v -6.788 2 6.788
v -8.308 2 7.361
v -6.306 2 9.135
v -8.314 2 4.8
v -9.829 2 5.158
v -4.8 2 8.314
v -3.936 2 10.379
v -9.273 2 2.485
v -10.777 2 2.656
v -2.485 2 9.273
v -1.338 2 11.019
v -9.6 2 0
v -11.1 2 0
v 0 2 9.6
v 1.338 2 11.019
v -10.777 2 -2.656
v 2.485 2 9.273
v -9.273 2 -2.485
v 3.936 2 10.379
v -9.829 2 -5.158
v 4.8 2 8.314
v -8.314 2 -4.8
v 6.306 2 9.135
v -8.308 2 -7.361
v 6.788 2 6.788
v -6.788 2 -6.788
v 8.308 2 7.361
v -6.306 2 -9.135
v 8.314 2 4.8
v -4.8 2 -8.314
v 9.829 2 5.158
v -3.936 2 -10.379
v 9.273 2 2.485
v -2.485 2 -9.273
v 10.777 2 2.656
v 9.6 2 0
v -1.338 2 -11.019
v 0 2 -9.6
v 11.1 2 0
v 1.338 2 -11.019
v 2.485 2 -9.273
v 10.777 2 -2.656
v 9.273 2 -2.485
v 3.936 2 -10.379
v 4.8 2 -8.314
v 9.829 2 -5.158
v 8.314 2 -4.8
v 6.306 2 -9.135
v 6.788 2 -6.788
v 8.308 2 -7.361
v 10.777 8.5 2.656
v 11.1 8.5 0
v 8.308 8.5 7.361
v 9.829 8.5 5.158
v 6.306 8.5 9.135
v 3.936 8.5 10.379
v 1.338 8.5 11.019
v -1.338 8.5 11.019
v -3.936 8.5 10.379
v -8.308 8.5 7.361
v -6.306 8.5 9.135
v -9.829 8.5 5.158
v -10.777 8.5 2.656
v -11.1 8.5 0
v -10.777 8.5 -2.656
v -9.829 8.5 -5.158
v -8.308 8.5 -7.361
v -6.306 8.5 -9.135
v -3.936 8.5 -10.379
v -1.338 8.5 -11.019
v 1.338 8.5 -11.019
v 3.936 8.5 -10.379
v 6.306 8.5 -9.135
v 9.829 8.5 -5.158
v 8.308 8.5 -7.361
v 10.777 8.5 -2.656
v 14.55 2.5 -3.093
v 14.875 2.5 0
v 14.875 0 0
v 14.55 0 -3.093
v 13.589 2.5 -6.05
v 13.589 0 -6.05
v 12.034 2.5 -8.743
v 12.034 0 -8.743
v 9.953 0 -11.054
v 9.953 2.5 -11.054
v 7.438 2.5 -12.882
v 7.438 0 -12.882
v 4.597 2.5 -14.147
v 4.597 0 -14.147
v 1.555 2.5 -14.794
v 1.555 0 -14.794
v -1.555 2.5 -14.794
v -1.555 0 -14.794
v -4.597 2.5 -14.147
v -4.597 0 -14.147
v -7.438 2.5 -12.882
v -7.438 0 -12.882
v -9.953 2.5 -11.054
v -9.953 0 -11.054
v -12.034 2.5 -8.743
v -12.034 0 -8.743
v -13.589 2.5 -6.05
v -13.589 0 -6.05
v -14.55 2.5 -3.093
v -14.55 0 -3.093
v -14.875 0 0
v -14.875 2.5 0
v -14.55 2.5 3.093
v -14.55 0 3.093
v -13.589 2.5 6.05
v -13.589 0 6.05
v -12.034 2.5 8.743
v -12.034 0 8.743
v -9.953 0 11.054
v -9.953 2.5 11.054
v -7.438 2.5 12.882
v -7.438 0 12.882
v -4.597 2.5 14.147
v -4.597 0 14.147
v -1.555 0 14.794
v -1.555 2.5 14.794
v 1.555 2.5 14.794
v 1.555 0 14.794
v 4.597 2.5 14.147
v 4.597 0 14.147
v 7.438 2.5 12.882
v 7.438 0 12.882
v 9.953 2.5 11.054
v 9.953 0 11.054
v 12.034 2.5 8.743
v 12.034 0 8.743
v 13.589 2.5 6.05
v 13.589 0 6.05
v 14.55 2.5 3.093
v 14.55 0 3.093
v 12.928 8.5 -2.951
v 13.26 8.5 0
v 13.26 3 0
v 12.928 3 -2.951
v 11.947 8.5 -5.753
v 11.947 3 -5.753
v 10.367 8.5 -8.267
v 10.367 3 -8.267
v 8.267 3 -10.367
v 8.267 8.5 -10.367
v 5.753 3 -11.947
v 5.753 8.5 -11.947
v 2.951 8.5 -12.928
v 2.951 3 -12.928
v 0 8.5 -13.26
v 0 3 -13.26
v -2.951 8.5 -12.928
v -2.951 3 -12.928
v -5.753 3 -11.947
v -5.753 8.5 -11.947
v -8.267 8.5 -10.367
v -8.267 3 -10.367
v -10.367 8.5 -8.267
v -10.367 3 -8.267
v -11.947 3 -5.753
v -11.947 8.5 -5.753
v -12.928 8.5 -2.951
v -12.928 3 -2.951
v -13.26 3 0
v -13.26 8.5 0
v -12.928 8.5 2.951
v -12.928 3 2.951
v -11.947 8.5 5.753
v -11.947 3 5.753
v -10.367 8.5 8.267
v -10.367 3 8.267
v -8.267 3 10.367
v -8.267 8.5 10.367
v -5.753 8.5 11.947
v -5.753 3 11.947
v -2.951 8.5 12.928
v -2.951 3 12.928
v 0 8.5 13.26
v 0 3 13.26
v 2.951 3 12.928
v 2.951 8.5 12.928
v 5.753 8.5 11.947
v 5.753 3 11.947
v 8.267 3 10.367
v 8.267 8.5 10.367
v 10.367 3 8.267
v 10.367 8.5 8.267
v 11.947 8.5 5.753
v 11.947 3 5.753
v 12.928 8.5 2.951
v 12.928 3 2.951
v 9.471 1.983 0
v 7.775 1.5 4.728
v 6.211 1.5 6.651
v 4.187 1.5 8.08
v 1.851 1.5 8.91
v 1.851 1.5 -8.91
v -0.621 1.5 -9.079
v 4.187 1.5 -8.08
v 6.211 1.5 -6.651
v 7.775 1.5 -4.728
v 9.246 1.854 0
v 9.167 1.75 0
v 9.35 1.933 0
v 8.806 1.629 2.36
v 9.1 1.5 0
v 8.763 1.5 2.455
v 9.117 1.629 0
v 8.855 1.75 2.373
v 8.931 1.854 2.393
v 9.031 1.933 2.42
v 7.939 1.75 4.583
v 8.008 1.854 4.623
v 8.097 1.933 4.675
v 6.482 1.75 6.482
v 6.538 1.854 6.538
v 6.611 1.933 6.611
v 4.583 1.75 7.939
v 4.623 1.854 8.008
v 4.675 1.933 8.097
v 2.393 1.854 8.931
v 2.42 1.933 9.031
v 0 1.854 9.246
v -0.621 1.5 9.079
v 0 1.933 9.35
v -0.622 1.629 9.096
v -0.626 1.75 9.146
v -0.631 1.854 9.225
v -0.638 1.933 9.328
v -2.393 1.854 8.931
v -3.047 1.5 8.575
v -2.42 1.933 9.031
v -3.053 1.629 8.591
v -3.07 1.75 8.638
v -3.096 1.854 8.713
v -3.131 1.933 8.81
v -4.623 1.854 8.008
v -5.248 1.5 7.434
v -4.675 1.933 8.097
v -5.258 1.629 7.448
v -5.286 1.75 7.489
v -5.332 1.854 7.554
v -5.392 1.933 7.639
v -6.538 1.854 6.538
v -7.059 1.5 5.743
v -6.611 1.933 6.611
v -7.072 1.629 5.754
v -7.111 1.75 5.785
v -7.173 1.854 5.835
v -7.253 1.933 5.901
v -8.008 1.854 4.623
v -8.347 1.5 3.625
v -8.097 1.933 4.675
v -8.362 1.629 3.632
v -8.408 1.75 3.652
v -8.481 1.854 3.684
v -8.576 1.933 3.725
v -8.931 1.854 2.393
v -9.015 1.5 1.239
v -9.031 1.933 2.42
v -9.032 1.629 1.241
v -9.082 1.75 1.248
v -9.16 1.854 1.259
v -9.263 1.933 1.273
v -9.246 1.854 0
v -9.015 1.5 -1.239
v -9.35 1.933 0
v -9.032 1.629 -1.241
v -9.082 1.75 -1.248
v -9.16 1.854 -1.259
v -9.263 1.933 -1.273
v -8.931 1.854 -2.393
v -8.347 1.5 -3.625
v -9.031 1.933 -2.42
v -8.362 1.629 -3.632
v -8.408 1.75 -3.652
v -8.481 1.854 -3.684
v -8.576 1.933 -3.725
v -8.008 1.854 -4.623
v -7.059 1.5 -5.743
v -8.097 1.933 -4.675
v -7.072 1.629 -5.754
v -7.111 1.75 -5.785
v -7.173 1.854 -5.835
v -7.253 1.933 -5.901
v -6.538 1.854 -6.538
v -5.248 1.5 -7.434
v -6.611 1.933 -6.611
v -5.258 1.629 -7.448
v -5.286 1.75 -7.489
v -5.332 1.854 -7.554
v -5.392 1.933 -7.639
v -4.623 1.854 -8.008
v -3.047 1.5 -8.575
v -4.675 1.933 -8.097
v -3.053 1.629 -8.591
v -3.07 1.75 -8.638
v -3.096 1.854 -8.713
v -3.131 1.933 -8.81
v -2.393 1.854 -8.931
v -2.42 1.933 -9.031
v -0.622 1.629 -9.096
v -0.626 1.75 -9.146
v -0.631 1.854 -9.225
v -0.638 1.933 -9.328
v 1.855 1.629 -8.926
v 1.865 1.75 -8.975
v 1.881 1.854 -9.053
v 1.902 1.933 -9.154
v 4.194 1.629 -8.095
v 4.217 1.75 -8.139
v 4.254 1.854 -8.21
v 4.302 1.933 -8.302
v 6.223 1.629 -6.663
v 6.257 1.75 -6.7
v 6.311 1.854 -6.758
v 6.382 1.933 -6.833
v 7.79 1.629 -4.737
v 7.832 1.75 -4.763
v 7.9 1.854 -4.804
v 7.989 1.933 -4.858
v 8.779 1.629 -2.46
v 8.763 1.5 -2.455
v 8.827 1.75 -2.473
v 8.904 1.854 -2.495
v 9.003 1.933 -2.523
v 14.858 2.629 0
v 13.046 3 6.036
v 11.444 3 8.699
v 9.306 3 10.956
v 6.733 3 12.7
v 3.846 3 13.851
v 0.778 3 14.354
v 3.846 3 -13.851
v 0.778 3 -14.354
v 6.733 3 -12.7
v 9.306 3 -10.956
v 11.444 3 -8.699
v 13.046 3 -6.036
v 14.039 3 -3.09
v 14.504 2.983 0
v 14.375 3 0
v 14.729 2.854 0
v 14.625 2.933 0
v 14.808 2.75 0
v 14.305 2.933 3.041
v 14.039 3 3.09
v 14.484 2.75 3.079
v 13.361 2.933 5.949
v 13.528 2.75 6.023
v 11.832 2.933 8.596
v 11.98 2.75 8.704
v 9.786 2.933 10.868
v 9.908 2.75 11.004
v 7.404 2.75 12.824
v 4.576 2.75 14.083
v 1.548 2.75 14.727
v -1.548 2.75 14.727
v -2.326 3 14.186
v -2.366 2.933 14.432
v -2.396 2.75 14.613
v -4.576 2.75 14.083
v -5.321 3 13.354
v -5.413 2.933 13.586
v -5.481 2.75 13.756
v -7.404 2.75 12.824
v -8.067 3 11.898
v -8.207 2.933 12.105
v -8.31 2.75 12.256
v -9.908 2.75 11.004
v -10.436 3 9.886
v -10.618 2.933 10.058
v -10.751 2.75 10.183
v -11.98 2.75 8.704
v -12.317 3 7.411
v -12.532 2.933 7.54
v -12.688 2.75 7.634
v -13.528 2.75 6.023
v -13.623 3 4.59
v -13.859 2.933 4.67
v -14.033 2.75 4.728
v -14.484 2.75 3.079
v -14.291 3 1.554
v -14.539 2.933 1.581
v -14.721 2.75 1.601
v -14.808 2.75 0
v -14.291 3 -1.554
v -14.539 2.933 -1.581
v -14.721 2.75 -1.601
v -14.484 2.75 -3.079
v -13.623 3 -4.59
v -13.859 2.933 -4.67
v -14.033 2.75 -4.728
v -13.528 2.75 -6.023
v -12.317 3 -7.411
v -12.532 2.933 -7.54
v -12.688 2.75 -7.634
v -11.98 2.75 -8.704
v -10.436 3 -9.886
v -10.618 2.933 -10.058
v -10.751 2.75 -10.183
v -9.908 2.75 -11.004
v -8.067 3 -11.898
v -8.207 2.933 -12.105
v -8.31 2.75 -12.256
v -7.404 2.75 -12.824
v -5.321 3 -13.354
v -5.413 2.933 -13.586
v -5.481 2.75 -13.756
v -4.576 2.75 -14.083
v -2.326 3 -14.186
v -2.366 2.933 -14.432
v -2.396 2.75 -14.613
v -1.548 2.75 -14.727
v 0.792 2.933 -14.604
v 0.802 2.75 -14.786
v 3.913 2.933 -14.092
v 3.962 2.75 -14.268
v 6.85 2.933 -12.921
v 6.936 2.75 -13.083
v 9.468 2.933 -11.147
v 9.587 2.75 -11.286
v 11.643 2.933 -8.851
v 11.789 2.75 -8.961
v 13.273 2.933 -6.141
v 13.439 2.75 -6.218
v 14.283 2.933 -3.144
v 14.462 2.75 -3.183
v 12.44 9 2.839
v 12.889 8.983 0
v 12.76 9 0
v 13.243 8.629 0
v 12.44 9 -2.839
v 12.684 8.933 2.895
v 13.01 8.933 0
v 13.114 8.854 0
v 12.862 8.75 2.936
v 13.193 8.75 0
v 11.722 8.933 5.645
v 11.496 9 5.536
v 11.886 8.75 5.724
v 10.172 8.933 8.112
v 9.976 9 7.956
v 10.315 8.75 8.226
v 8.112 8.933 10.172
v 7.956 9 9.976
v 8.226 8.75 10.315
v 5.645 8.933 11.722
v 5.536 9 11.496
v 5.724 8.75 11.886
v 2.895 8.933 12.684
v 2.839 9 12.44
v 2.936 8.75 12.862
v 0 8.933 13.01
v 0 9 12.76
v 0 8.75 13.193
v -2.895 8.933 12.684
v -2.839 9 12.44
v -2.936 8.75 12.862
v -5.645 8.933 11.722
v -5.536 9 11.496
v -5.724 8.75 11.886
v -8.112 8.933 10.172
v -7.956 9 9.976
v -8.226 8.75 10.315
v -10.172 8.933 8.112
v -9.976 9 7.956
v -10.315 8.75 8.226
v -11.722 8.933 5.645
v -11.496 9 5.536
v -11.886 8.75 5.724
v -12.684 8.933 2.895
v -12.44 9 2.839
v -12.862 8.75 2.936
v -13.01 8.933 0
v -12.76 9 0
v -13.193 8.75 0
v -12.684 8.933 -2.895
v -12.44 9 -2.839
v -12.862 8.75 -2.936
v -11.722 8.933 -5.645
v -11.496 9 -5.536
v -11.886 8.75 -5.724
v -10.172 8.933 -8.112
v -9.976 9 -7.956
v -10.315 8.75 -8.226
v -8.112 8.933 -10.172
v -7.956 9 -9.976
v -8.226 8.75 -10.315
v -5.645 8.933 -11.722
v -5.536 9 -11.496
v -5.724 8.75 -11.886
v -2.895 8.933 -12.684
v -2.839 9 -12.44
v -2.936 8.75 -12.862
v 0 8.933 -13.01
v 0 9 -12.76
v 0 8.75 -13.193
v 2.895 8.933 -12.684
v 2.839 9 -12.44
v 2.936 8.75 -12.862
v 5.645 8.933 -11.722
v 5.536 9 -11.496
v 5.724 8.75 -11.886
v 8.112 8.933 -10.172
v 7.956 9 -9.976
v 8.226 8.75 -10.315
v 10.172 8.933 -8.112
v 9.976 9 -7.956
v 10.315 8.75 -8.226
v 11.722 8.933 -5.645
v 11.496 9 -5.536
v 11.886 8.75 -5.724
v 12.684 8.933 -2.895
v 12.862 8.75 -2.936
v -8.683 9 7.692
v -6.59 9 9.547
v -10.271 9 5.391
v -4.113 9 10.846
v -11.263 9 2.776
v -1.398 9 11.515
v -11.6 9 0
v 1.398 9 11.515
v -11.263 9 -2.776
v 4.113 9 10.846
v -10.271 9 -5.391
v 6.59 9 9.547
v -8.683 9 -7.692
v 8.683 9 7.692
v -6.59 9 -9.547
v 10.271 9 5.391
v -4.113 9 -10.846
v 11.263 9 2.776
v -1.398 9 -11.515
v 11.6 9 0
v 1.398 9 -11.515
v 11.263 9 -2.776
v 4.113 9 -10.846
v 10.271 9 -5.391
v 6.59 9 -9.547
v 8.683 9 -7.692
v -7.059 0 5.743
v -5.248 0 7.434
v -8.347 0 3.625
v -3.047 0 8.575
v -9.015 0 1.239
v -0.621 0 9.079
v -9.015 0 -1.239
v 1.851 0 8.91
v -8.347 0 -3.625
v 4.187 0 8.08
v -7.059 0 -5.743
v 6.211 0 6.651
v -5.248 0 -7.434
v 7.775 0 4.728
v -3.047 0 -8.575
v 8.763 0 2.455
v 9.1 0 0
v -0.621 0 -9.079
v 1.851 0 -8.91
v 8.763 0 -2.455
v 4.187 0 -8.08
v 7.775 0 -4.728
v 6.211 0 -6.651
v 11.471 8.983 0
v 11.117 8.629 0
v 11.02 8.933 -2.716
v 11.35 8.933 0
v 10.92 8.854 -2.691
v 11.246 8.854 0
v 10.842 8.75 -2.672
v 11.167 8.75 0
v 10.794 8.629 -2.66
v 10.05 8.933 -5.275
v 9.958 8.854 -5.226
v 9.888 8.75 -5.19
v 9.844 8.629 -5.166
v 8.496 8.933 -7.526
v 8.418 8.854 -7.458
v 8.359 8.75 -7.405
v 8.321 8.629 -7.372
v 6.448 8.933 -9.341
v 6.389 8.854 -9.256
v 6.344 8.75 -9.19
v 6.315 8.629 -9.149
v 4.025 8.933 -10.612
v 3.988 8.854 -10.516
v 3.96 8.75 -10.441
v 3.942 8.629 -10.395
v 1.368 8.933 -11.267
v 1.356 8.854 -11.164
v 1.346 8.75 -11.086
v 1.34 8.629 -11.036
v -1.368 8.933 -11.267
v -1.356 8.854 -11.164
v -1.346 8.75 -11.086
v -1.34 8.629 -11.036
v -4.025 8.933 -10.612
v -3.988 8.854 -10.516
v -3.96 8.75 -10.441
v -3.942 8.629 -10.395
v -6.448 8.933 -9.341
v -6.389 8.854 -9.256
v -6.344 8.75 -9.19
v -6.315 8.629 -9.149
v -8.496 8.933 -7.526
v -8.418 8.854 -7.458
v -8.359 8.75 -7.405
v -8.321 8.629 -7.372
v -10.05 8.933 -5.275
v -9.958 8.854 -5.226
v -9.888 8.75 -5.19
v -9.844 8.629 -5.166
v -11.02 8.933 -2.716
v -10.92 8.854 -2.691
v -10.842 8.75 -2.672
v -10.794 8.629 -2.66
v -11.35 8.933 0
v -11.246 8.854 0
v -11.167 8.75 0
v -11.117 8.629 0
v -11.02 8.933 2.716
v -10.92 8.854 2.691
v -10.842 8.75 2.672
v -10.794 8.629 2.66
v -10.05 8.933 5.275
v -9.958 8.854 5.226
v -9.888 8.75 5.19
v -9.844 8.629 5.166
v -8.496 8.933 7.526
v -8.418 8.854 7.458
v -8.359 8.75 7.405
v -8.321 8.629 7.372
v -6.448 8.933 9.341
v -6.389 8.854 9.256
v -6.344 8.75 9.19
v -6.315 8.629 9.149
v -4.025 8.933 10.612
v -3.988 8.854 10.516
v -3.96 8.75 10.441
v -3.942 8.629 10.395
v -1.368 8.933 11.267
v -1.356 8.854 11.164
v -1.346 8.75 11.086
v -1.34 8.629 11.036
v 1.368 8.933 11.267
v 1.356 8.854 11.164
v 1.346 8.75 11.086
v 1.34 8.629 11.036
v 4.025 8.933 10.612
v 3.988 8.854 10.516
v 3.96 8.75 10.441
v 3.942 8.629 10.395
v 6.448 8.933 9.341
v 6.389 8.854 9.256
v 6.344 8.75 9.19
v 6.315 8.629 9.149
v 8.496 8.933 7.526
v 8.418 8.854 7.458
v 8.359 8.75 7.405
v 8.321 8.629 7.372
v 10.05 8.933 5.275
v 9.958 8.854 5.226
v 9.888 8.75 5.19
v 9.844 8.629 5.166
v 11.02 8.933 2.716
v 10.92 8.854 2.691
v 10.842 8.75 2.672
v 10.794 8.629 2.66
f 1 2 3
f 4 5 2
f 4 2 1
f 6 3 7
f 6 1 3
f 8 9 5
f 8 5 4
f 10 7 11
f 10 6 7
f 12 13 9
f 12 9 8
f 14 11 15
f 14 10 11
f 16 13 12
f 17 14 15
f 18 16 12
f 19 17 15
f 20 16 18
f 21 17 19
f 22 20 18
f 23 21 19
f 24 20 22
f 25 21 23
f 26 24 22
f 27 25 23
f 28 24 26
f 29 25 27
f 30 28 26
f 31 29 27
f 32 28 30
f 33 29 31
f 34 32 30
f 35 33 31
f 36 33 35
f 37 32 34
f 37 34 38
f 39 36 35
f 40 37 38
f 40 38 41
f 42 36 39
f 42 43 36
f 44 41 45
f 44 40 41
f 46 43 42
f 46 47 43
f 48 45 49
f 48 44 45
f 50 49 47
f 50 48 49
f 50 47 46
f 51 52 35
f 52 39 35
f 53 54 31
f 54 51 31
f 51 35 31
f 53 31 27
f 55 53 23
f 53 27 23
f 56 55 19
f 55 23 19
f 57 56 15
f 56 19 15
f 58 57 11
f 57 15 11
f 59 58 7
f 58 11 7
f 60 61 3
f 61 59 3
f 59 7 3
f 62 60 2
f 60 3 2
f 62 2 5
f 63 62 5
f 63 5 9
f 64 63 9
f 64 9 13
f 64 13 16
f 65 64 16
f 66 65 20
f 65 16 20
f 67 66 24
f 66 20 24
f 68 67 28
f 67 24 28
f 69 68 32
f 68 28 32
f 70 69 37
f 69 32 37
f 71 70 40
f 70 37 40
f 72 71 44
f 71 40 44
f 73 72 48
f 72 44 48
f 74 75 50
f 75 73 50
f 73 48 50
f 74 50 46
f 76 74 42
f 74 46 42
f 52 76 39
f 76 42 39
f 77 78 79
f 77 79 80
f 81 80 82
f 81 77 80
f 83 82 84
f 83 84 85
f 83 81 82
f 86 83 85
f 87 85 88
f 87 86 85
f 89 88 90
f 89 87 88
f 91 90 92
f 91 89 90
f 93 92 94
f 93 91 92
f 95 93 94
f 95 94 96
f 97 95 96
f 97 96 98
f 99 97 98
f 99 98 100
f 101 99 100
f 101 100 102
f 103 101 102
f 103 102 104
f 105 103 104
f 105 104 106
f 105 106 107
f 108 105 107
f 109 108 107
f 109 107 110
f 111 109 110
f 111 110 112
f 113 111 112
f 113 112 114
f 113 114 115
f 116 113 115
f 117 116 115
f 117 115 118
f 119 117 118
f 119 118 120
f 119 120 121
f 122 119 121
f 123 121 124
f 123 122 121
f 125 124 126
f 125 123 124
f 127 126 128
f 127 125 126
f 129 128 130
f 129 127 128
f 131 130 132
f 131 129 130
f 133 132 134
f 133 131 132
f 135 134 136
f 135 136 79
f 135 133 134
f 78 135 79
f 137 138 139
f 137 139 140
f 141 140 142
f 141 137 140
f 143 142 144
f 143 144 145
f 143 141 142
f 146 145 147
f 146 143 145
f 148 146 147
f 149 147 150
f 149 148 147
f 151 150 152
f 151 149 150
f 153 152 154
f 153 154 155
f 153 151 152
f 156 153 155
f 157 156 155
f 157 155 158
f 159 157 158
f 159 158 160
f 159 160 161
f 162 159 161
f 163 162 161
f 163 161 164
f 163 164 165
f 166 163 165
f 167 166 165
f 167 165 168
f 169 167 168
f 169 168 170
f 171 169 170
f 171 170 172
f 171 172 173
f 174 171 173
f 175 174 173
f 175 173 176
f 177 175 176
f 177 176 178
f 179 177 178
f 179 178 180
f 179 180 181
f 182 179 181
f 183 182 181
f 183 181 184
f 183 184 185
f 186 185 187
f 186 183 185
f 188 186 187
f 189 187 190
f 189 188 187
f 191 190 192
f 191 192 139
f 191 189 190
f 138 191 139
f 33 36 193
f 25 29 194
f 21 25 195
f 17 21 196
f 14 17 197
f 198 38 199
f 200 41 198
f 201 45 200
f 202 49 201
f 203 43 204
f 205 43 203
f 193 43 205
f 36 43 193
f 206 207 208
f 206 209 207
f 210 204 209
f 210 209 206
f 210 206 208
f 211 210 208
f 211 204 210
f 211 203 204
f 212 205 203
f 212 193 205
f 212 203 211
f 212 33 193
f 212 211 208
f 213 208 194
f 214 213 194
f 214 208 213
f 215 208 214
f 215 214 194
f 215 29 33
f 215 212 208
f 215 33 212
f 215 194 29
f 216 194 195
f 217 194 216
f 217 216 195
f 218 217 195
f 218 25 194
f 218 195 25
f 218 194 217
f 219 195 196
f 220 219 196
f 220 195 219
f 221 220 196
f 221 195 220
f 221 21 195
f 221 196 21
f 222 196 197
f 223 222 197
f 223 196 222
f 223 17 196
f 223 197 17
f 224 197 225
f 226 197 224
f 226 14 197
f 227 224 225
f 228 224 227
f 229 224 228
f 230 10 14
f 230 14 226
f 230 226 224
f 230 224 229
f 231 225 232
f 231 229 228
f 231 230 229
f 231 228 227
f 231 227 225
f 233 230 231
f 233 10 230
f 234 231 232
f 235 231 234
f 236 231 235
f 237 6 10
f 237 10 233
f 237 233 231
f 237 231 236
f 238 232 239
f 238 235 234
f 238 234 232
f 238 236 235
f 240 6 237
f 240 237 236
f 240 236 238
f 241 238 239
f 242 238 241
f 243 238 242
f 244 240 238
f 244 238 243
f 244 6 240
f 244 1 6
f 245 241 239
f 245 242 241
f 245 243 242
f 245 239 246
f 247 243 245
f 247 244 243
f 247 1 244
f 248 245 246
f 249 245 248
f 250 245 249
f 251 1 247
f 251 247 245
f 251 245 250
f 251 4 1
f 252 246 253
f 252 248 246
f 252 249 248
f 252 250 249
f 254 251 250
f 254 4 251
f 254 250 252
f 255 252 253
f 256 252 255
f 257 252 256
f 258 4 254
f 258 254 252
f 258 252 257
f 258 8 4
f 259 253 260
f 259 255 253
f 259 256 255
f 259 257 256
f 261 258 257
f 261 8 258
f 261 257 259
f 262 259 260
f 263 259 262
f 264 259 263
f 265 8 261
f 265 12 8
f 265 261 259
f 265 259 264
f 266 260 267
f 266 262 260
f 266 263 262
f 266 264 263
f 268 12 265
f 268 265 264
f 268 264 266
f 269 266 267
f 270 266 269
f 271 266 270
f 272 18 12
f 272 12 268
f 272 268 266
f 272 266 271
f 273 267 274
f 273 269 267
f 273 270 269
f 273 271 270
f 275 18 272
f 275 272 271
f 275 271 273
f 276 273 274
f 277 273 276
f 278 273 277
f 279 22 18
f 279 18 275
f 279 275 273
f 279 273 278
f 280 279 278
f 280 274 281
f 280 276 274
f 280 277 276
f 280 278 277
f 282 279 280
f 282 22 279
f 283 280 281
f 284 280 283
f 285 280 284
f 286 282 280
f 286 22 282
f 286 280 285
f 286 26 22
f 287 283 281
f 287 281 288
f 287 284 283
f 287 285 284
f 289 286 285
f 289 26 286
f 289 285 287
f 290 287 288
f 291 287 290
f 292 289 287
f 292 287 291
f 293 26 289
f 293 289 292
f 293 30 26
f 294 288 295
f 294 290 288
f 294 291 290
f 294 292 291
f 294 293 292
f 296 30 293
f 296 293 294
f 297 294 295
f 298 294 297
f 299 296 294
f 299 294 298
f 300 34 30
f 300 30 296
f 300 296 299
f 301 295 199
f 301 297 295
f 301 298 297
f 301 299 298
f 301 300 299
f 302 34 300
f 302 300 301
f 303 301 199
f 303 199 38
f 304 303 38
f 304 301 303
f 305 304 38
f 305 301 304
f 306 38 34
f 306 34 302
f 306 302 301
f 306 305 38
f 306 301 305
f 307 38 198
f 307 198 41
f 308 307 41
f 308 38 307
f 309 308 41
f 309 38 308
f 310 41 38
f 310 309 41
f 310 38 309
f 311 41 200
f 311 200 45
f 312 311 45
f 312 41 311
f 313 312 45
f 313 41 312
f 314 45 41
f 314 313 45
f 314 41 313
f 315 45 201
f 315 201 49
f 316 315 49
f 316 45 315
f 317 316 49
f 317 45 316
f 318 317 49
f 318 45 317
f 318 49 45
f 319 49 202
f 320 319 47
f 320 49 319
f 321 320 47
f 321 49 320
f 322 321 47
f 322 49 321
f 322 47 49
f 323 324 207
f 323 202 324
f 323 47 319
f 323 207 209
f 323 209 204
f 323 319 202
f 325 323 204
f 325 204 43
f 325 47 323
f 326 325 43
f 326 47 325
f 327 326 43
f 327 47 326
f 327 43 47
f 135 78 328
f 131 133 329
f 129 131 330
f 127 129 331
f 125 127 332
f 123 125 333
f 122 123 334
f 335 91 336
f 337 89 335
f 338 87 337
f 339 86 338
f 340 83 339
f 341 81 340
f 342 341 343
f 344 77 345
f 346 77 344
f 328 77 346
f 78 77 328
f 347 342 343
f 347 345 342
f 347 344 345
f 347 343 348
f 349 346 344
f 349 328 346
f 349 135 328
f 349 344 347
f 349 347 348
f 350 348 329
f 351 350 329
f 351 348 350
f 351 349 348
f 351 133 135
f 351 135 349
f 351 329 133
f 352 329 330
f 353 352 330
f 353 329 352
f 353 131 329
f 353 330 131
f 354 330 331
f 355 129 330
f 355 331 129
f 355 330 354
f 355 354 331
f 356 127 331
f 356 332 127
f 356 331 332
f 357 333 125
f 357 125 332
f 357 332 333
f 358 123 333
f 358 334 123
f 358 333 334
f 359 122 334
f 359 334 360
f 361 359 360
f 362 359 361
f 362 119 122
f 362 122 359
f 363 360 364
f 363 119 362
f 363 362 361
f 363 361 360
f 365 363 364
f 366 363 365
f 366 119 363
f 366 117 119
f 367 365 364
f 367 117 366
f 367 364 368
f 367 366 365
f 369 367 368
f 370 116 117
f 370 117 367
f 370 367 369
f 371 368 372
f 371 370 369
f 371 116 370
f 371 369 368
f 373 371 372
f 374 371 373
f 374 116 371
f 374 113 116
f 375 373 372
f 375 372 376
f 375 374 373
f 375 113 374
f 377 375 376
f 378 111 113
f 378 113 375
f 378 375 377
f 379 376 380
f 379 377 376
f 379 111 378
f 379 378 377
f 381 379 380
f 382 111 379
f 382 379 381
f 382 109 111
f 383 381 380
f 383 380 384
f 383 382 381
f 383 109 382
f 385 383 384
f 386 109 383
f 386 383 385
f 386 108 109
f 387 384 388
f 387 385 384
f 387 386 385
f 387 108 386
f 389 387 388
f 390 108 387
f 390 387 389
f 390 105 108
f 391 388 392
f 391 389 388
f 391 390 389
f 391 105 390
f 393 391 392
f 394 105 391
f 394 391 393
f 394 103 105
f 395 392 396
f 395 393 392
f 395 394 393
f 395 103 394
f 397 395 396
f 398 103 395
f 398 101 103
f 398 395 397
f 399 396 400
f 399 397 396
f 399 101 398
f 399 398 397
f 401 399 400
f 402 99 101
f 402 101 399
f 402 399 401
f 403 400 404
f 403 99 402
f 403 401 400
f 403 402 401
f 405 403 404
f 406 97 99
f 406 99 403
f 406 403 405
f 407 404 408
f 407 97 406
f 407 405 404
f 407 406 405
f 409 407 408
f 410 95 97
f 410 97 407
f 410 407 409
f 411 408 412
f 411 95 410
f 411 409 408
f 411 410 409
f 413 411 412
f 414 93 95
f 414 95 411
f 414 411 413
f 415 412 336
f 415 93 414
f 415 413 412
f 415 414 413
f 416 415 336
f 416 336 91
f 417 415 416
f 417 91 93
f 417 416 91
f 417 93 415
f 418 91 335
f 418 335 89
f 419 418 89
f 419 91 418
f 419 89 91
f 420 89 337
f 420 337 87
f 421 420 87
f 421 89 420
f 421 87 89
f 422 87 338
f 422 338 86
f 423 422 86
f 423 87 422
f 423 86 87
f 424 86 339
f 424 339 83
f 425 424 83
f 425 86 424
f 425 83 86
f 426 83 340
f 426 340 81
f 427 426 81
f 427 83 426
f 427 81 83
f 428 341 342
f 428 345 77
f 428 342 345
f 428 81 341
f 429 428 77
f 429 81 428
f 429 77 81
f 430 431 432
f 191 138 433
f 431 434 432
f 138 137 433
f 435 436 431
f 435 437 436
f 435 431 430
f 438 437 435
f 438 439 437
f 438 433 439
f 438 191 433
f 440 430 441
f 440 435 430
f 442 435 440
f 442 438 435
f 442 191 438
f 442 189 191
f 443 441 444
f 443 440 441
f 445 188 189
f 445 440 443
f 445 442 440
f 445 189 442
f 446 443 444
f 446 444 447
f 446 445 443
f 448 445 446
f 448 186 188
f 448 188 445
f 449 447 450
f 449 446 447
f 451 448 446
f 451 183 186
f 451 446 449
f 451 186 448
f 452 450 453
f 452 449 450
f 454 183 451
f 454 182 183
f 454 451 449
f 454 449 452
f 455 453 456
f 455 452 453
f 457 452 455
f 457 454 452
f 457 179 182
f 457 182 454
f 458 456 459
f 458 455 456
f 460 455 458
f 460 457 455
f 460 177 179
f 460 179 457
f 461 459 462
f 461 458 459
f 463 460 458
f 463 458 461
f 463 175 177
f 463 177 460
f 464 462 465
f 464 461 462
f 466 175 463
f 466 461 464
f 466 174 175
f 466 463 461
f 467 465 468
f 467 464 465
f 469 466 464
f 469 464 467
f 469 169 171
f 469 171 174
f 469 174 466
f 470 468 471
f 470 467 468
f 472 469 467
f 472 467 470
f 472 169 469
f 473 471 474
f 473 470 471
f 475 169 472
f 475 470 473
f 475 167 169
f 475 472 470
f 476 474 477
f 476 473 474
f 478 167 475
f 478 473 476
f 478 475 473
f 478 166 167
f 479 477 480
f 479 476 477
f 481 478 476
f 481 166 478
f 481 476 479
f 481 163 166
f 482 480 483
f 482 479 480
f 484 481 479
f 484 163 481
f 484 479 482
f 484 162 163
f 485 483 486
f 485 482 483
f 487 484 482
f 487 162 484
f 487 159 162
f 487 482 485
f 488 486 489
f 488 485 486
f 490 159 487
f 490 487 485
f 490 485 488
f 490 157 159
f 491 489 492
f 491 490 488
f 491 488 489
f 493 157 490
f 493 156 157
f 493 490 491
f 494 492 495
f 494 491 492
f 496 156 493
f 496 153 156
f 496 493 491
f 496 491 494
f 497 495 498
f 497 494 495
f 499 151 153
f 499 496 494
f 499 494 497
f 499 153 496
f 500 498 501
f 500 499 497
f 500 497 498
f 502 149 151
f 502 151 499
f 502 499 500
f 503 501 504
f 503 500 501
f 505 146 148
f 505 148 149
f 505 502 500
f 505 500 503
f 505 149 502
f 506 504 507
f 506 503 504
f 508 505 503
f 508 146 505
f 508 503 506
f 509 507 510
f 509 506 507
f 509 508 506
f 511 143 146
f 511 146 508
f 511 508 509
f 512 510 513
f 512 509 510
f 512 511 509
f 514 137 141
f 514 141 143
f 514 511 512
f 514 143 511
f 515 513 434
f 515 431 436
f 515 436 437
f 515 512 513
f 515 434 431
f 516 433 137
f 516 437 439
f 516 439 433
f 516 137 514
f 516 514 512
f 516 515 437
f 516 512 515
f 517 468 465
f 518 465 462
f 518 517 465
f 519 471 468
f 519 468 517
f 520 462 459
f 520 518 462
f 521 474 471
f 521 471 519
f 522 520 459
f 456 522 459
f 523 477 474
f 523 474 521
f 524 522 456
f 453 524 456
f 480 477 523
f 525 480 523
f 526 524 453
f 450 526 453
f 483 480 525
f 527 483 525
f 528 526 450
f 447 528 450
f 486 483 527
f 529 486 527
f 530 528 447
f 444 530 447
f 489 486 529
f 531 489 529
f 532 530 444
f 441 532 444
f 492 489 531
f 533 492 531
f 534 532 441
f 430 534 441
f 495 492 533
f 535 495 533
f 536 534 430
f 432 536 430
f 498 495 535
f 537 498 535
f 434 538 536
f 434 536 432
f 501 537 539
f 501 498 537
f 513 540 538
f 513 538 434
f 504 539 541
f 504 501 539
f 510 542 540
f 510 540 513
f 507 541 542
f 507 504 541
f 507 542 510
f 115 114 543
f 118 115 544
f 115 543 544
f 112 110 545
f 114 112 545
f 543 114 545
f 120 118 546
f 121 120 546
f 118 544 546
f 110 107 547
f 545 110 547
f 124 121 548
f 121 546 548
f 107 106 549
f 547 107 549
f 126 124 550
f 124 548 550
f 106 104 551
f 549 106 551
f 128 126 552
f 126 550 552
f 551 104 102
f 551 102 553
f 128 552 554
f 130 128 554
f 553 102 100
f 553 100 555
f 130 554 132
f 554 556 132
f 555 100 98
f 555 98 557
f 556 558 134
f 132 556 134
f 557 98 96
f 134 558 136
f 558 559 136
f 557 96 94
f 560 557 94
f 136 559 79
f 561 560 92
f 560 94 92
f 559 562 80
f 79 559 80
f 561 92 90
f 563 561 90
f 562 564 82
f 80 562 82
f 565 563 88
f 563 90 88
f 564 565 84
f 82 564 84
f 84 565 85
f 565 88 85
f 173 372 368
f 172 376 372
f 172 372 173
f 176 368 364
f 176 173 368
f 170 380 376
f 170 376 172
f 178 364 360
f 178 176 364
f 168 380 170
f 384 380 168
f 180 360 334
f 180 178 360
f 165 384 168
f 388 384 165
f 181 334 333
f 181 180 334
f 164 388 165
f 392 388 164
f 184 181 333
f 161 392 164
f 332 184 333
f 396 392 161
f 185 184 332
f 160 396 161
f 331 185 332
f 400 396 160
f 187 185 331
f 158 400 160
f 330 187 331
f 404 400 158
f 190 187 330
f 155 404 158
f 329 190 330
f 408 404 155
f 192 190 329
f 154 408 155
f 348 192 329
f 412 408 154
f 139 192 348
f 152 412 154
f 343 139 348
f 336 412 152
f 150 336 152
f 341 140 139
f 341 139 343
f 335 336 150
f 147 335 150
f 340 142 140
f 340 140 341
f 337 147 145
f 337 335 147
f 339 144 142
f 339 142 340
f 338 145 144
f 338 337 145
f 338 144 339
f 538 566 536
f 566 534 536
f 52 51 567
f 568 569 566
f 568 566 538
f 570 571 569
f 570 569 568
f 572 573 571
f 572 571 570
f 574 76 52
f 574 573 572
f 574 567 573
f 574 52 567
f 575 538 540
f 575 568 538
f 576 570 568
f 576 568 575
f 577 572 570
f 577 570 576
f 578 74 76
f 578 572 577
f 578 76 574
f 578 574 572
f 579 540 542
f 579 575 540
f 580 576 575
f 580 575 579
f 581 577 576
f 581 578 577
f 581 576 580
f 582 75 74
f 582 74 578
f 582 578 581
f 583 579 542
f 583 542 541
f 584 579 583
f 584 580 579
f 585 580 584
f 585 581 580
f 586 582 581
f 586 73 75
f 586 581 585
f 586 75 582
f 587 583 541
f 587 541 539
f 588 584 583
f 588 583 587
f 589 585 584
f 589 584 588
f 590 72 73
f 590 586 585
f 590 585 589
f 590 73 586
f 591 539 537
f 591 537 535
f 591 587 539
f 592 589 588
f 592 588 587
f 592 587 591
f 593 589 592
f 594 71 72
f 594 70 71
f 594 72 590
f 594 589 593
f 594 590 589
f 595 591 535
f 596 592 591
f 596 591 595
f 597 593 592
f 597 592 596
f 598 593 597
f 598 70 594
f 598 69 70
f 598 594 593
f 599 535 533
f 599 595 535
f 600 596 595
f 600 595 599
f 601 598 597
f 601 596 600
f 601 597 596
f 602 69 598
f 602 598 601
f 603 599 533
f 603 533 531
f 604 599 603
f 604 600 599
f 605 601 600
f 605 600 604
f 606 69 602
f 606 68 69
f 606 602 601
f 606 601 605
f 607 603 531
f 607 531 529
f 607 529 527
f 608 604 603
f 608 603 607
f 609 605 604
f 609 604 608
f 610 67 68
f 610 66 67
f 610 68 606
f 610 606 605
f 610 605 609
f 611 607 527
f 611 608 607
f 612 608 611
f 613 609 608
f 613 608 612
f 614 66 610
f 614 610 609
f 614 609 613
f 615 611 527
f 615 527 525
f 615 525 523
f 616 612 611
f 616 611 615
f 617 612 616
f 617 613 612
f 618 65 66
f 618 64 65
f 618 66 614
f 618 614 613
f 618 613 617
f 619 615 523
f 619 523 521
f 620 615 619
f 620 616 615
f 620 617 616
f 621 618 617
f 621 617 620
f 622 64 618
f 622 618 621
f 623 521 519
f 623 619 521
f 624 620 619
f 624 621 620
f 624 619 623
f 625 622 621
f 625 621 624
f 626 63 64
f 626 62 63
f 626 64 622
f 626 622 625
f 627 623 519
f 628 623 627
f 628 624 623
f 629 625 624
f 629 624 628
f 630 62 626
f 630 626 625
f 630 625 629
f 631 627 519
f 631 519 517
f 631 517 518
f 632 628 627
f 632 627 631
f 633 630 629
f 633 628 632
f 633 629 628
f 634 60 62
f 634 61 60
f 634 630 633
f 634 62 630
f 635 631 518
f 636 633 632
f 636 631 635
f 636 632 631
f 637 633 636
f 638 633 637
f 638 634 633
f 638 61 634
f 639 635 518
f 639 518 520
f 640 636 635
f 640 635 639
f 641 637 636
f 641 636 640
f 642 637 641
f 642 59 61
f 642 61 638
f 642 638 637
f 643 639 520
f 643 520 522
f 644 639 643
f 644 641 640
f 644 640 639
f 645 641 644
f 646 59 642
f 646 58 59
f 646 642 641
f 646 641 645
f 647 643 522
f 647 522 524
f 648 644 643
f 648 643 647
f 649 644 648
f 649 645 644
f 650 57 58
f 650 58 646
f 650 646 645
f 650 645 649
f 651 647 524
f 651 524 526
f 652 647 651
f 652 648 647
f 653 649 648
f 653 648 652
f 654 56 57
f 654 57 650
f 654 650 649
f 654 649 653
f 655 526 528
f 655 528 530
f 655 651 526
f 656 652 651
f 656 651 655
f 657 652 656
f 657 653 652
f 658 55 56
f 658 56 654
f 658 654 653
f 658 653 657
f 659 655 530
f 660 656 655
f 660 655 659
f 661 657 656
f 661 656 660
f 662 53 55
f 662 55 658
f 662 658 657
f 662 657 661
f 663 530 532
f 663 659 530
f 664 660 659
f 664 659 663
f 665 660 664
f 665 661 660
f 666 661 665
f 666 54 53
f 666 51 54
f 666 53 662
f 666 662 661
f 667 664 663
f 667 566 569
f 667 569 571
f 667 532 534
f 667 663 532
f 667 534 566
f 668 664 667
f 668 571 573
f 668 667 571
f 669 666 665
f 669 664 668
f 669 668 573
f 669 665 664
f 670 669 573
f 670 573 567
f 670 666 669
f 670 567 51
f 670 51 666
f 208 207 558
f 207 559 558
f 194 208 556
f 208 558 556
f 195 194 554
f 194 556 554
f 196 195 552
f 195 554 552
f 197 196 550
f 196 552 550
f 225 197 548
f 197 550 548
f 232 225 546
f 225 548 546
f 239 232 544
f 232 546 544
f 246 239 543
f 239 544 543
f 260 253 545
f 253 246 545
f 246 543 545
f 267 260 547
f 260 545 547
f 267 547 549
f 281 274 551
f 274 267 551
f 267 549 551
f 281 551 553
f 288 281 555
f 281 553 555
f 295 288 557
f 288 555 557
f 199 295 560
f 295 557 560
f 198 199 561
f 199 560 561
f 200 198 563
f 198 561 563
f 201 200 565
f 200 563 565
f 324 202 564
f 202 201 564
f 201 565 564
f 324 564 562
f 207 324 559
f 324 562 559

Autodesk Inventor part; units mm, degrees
ref_plane "YZ Plane" through (0, 0, 0) normal (1, 0, 0) x (0, 1, 0)
ref_plane "XZ Plane" through (0, 0, 0) normal (0, 1, 0) x (-1, 0, 0)
ref_plane "XY Plane" through (0, 0, 0) normal (0, 0, 1) x (1, 0, 0)
sketch "Sketch1" plane through (0, 0, 0) normal (0, 0, 1) x (1, 0, 0)
  line L0 (0, 0) -> (0, 10.0763) construction
  line L1 (11.1, 9) -> (11.1, 2)
  line L2 (11.1, 2) -> (9.1, 2)
  line L3 (9.1, 2) -> (9.1, 0)
  line L4 (9.1, 0) -> (14.875, 0)
  line L5 (14.875, 0) -> (14.875, 3)
  line L6 (14.875, 3) -> (13.26, 3)
  line L7 (13.26, 3) -> (13.26, 9)
  line L8 (13.26, 9) -> (11.1, 9)
  dimension "d0" = 2
  dimension "d1" = 7
  dimension "d2" = 13.26
  dimension "d3" = 14.875
  dimension "d4" = 6
  dimension "d5" = 11.1
  dimension "d6" = 2
revolve "Revolution1" add sketch "Sketch1" angle 360 about axis through (0, 0, 0) along (0, 1, 0)
fillet "Fillet1" radius 0.5 4 edges at (-13.26, 9, 0) (-11.1, 9, 0) (-14.875, 3, 0) (-9.1, 2, 0)
properties part number "beltPulley"
